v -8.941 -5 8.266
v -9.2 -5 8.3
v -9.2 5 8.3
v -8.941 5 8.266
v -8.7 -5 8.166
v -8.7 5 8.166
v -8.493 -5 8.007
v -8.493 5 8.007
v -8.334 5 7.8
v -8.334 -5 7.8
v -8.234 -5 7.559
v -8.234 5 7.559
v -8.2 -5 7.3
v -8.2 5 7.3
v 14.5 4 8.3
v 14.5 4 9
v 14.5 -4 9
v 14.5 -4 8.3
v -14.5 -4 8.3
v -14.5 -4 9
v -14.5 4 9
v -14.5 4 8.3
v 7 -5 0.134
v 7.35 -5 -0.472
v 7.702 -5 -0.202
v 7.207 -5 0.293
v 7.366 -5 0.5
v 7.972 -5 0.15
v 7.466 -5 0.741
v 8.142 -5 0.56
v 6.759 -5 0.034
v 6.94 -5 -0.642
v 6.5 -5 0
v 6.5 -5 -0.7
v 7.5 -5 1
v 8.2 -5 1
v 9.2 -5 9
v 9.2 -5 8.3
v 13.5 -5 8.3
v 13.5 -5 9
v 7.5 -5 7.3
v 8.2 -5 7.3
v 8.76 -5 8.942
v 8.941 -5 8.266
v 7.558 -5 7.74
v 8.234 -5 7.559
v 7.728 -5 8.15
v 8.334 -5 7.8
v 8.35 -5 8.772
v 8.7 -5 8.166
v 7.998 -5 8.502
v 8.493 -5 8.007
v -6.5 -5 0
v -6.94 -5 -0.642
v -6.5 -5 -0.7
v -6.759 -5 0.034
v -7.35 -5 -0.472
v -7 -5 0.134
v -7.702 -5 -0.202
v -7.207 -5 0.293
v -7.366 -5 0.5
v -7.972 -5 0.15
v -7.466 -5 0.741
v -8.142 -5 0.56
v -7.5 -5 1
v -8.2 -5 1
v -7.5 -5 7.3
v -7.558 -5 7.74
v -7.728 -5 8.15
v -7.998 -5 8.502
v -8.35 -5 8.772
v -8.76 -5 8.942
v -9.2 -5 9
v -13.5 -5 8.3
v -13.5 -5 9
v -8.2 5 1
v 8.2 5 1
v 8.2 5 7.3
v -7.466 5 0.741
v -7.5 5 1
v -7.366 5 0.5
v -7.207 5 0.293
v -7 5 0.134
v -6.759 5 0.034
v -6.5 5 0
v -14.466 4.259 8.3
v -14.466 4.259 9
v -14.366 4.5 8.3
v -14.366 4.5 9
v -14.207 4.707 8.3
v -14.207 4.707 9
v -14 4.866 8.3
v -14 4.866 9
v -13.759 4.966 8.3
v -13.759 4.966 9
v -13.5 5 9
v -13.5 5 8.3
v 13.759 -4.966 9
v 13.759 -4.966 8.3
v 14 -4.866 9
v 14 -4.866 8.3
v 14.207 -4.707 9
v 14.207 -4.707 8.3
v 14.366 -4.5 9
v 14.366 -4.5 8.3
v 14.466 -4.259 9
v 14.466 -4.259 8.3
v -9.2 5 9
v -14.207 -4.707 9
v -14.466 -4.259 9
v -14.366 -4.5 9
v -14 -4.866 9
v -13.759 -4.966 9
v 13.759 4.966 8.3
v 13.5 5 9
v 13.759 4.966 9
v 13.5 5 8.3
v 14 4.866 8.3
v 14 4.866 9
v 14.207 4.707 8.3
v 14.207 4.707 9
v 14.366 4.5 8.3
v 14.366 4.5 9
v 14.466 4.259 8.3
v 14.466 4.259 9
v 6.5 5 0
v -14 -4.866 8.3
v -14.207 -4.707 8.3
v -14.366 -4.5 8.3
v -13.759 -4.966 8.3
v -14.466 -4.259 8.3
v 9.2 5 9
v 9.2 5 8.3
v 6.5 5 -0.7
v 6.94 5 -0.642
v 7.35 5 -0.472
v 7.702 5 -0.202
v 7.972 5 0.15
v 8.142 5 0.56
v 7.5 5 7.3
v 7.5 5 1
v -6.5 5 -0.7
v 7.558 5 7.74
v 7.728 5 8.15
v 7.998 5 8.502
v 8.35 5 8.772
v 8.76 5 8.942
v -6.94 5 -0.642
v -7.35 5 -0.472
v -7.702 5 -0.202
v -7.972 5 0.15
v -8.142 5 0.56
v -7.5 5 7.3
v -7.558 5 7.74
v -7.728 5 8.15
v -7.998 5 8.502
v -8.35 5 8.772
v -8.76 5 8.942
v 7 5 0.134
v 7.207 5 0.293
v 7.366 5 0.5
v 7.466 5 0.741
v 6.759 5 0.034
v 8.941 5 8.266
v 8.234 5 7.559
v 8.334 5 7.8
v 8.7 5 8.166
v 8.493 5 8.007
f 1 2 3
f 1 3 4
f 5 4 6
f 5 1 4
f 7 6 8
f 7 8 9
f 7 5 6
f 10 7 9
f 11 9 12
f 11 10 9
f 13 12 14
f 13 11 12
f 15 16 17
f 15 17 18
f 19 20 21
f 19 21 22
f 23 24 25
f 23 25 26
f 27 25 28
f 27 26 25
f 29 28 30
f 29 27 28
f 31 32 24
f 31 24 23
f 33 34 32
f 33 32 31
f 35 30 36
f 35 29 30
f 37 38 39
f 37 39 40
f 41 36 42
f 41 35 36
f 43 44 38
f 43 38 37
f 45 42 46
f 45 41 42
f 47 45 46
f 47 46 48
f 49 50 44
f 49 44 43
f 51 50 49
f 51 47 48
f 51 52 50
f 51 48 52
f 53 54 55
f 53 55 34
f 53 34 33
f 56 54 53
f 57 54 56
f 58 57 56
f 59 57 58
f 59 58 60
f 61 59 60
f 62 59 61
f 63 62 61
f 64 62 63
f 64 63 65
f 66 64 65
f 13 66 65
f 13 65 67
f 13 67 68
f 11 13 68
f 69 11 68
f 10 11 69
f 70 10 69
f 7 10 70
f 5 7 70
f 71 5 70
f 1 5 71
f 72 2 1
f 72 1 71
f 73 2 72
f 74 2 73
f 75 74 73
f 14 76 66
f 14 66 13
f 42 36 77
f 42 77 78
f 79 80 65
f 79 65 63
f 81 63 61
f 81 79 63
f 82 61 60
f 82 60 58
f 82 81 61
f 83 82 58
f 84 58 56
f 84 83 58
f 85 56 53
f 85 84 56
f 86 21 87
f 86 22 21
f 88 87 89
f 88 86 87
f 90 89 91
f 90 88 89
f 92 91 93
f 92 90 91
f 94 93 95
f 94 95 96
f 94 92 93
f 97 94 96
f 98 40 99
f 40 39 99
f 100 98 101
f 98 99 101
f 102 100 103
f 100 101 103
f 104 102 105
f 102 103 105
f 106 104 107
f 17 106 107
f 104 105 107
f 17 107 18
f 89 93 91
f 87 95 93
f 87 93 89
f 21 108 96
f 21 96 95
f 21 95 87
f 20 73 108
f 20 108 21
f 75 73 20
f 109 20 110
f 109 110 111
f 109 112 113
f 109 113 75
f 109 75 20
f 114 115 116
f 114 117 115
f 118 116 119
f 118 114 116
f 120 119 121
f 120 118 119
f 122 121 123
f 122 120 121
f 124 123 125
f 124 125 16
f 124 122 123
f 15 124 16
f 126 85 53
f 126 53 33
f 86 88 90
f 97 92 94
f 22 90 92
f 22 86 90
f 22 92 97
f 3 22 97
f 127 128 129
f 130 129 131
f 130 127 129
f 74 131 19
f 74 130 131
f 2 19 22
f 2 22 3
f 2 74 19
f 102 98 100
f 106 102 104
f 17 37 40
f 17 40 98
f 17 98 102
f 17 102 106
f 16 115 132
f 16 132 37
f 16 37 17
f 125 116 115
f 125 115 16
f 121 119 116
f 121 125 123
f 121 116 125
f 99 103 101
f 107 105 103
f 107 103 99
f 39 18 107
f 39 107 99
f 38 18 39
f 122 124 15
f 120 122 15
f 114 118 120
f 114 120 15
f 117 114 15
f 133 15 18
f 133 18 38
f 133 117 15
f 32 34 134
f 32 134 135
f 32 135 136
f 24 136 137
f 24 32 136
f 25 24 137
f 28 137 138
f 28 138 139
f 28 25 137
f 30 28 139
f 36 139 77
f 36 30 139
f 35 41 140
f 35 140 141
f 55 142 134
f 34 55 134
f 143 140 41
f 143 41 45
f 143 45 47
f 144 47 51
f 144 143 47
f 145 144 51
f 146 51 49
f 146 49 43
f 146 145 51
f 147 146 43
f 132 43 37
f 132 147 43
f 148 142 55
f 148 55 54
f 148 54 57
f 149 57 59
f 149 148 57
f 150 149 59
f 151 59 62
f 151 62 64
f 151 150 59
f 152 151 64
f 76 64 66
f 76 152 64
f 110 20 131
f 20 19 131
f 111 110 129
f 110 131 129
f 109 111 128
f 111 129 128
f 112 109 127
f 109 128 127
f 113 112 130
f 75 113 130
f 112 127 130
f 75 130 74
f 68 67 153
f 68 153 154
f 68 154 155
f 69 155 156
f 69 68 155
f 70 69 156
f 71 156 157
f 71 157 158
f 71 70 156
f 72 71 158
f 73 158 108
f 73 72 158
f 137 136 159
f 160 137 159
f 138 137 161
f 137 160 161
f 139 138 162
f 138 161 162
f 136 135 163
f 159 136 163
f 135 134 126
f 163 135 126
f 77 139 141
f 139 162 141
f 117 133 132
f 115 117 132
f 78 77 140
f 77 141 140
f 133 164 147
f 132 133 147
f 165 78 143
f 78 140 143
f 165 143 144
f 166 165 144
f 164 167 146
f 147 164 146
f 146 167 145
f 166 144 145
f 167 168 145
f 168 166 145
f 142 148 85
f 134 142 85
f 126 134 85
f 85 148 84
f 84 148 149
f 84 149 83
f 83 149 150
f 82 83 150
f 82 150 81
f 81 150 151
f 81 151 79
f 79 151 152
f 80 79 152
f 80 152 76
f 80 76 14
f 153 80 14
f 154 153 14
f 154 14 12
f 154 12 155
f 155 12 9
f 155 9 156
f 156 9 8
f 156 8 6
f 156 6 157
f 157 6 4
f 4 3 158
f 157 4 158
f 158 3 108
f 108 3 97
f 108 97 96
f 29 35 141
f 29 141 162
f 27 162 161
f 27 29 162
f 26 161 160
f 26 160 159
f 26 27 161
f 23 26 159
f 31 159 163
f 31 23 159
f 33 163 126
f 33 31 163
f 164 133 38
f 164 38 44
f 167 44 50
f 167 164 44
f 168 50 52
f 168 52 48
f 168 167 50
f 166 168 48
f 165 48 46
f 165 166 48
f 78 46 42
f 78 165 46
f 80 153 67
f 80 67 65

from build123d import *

# Parameters (mm, degrees)
SKETCH2_W                    = 15
SKETCH2_H                    = 10
BASE_FLANGE1_DEPTH           = 0.7
EDGE_FLANGE1_STRIP_W         = 4.8
EDGE_FLANGE1_STRIP_H         = 0.7
EDGE_FLANGE1_STRIP_CUT_DEPTH = 10
EDGE_FLANGE1_DEPTH           = 10
EDGE_FLANGE2_STRIP_W         = 4.8
EDGE_FLANGE2_STRIP_H         = 0.7
EDGE_FLANGE2_STRIP_CUT_DEPTH = 10
EDGE_FLANGE2_DEPTH           = 10
EDGE_FLANGE3_STRIP_W         = 4.8
EDGE_FLANGE3_STRIP_H         = 0.7
EDGE_FLANGE3_STRIP_CUT_DEPTH = 10
EDGE_FLANGE3_DEPTH           = 10
EDGE_FLANGE4_STRIP_W         = 4.8
EDGE_FLANGE4_STRIP_H         = 0.7
EDGE_FLANGE4_STRIP_CUT_DEPTH = 10
EDGE_FLANGE4_DEPTH           = 10
FILLET1_R                    = 1


# Sheet-metal steps are written as plain solids
with BuildPart() as part:
    # Sketch2 → Base-Flange1 (new body)
    with BuildSketch(Plane.XY):
        Rectangle(SKETCH2_W, SKETCH2_H)
    extrude(amount=-BASE_FLANGE1_DEPTH)

    # Edge-Flange1 strip (across the edge) → Edge-Flange1 strip cut (cut)
    with BuildSketch(Plane(origin=(-7.5, 5, 0), x_dir=(1, 0, 0), z_dir=(0, -1, 0))):
        with Locations((-1.4, -0.35)):
            Rectangle(EDGE_FLANGE1_STRIP_W, EDGE_FLANGE1_STRIP_H)
    extrude(amount=EDGE_FLANGE1_STRIP_CUT_DEPTH, mode=Mode.SUBTRACT)

    # Edge-Flange1 section (across the edge) → Edge-Flange1 (add)
    with BuildSketch(Plane(origin=(-7.5, 5, 0), x_dir=(1, 0, 0), z_dir=(0, -1, 0))):
        with BuildLine():
            Line((-0.7, 1), (-0.7, 8.3))
            Line((-0.7, 8.3), (0, 8.3))
            Line((0, 8.3), (0, 1))
            ThreePointArc((0, 1), (0.292893219, 0.292893219), (1, 0))
            Line((1, 0), (1, -0.7))
            ThreePointArc((1, -0.7), (-0.202081528, -0.202081528), (-0.7, 1))
        make_face()
    extrude(amount=EDGE_FLANGE1_DEPTH)

    # Edge-Flange2 strip (across the edge) → Edge-Flange2 strip cut (cut)
    with BuildSketch(Plane(origin=(7.5, -5, 0), x_dir=(-1, 0, 0), z_dir=(0, 1, 0))):
        with Locations((-1.4, -0.35)):
            Rectangle(EDGE_FLANGE2_STRIP_W, EDGE_FLANGE2_STRIP_H)
    extrude(amount=EDGE_FLANGE2_STRIP_CUT_DEPTH, mode=Mode.SUBTRACT)

    # Edge-Flange2 section (across the edge) → Edge-Flange2 (add)
    with BuildSketch(Plane(origin=(7.5, -5, 0), x_dir=(-1, 0, 0), z_dir=(0, 1, 0))):
        with BuildLine():
            Line((-0.7, 1), (-0.7, 8.3))
            Line((-0.7, 8.3), (0, 8.3))
            Line((0, 8.3), (0, 1))
            ThreePointArc((0, 1), (0.292893219, 0.292893219), (1, 0))
            Line((1, 0), (1, -0.7))
            ThreePointArc((1, -0.7), (-0.202081528, -0.202081528), (-0.7, 1))
        make_face()
    extrude(amount=EDGE_FLANGE2_DEPTH)

    # Edge-Flange3 strip (across the edge) → Edge-Flange3 strip cut (cut)
    with BuildSketch(Plane(origin=(8.2, 5, 8.3), x_dir=(0, 0, -1), z_dir=(0, -1, 0))):
        with Locations((-1.4, -0.35)):
            Rectangle(EDGE_FLANGE3_STRIP_W, EDGE_FLANGE3_STRIP_H)
    extrude(amount=EDGE_FLANGE3_STRIP_CUT_DEPTH, mode=Mode.SUBTRACT)

    # Edge-Flange3 section (across the edge) → Edge-Flange3 (add)
    with BuildSketch(Plane(origin=(8.2, 5, 8.3), x_dir=(0, 0, -1), z_dir=(0, -1, 0))):
        with BuildLine():
            Line((-0.7, 1), (-0.7, 6.3))
            Line((-0.7, 6.3), (0, 6.3))
            Line((0, 6.3), (0, 1))
            ThreePointArc((0, 1), (0.292893219, 0.292893219), (1, 0))
            Line((1, 0), (1, -0.7))
            ThreePointArc((1, -0.7), (-0.202081528, -0.202081528), (-0.7, 1))
        make_face()
    extrude(amount=EDGE_FLANGE3_DEPTH)

    # Edge-Flange4 strip (across the edge) → Edge-Flange4 strip cut (cut)
    with BuildSketch(Plane(origin=(-8.2, -5, 8.3), x_dir=(0, 0, -1), z_dir=(0, 1, 0))):
        with Locations((-1.4, -0.35)):
            Rectangle(EDGE_FLANGE4_STRIP_W, EDGE_FLANGE4_STRIP_H)
    extrude(amount=EDGE_FLANGE4_STRIP_CUT_DEPTH, mode=Mode.SUBTRACT)

    # Edge-Flange4 section (across the edge) → Edge-Flange4 (add)
    with BuildSketch(Plane(origin=(-8.2, -5, 8.3), x_dir=(0, 0, -1), z_dir=(0, 1, 0))):
        with BuildLine():
            Line((-0.7, 1), (-0.7, 6.3))
            Line((-0.7, 6.3), (0, 6.3))
            Line((0, 6.3), (0, 1))
            ThreePointArc((0, 1), (0.292893219, 0.292893219), (1, 0))
            Line((1, 0), (1, -0.7))
            ThreePointArc((1, -0.7), (-0.202081528, -0.202081528), (-0.7, 1))
        make_face()
    extrude(amount=EDGE_FLANGE4_DEPTH)

    # Fillet1
    fillet1_edges = [part.edges().sort_by_distance(p)[0] for p in [
        (14.5, -5, 8.65),
        (-14.5, -5, 8.65),
        (-14.5, 5, 8.65),
        (14.5, 5, 8.65),
    ]]
    fillet(fillet1_edges, radius=FILLET1_R)


solid = part.part
